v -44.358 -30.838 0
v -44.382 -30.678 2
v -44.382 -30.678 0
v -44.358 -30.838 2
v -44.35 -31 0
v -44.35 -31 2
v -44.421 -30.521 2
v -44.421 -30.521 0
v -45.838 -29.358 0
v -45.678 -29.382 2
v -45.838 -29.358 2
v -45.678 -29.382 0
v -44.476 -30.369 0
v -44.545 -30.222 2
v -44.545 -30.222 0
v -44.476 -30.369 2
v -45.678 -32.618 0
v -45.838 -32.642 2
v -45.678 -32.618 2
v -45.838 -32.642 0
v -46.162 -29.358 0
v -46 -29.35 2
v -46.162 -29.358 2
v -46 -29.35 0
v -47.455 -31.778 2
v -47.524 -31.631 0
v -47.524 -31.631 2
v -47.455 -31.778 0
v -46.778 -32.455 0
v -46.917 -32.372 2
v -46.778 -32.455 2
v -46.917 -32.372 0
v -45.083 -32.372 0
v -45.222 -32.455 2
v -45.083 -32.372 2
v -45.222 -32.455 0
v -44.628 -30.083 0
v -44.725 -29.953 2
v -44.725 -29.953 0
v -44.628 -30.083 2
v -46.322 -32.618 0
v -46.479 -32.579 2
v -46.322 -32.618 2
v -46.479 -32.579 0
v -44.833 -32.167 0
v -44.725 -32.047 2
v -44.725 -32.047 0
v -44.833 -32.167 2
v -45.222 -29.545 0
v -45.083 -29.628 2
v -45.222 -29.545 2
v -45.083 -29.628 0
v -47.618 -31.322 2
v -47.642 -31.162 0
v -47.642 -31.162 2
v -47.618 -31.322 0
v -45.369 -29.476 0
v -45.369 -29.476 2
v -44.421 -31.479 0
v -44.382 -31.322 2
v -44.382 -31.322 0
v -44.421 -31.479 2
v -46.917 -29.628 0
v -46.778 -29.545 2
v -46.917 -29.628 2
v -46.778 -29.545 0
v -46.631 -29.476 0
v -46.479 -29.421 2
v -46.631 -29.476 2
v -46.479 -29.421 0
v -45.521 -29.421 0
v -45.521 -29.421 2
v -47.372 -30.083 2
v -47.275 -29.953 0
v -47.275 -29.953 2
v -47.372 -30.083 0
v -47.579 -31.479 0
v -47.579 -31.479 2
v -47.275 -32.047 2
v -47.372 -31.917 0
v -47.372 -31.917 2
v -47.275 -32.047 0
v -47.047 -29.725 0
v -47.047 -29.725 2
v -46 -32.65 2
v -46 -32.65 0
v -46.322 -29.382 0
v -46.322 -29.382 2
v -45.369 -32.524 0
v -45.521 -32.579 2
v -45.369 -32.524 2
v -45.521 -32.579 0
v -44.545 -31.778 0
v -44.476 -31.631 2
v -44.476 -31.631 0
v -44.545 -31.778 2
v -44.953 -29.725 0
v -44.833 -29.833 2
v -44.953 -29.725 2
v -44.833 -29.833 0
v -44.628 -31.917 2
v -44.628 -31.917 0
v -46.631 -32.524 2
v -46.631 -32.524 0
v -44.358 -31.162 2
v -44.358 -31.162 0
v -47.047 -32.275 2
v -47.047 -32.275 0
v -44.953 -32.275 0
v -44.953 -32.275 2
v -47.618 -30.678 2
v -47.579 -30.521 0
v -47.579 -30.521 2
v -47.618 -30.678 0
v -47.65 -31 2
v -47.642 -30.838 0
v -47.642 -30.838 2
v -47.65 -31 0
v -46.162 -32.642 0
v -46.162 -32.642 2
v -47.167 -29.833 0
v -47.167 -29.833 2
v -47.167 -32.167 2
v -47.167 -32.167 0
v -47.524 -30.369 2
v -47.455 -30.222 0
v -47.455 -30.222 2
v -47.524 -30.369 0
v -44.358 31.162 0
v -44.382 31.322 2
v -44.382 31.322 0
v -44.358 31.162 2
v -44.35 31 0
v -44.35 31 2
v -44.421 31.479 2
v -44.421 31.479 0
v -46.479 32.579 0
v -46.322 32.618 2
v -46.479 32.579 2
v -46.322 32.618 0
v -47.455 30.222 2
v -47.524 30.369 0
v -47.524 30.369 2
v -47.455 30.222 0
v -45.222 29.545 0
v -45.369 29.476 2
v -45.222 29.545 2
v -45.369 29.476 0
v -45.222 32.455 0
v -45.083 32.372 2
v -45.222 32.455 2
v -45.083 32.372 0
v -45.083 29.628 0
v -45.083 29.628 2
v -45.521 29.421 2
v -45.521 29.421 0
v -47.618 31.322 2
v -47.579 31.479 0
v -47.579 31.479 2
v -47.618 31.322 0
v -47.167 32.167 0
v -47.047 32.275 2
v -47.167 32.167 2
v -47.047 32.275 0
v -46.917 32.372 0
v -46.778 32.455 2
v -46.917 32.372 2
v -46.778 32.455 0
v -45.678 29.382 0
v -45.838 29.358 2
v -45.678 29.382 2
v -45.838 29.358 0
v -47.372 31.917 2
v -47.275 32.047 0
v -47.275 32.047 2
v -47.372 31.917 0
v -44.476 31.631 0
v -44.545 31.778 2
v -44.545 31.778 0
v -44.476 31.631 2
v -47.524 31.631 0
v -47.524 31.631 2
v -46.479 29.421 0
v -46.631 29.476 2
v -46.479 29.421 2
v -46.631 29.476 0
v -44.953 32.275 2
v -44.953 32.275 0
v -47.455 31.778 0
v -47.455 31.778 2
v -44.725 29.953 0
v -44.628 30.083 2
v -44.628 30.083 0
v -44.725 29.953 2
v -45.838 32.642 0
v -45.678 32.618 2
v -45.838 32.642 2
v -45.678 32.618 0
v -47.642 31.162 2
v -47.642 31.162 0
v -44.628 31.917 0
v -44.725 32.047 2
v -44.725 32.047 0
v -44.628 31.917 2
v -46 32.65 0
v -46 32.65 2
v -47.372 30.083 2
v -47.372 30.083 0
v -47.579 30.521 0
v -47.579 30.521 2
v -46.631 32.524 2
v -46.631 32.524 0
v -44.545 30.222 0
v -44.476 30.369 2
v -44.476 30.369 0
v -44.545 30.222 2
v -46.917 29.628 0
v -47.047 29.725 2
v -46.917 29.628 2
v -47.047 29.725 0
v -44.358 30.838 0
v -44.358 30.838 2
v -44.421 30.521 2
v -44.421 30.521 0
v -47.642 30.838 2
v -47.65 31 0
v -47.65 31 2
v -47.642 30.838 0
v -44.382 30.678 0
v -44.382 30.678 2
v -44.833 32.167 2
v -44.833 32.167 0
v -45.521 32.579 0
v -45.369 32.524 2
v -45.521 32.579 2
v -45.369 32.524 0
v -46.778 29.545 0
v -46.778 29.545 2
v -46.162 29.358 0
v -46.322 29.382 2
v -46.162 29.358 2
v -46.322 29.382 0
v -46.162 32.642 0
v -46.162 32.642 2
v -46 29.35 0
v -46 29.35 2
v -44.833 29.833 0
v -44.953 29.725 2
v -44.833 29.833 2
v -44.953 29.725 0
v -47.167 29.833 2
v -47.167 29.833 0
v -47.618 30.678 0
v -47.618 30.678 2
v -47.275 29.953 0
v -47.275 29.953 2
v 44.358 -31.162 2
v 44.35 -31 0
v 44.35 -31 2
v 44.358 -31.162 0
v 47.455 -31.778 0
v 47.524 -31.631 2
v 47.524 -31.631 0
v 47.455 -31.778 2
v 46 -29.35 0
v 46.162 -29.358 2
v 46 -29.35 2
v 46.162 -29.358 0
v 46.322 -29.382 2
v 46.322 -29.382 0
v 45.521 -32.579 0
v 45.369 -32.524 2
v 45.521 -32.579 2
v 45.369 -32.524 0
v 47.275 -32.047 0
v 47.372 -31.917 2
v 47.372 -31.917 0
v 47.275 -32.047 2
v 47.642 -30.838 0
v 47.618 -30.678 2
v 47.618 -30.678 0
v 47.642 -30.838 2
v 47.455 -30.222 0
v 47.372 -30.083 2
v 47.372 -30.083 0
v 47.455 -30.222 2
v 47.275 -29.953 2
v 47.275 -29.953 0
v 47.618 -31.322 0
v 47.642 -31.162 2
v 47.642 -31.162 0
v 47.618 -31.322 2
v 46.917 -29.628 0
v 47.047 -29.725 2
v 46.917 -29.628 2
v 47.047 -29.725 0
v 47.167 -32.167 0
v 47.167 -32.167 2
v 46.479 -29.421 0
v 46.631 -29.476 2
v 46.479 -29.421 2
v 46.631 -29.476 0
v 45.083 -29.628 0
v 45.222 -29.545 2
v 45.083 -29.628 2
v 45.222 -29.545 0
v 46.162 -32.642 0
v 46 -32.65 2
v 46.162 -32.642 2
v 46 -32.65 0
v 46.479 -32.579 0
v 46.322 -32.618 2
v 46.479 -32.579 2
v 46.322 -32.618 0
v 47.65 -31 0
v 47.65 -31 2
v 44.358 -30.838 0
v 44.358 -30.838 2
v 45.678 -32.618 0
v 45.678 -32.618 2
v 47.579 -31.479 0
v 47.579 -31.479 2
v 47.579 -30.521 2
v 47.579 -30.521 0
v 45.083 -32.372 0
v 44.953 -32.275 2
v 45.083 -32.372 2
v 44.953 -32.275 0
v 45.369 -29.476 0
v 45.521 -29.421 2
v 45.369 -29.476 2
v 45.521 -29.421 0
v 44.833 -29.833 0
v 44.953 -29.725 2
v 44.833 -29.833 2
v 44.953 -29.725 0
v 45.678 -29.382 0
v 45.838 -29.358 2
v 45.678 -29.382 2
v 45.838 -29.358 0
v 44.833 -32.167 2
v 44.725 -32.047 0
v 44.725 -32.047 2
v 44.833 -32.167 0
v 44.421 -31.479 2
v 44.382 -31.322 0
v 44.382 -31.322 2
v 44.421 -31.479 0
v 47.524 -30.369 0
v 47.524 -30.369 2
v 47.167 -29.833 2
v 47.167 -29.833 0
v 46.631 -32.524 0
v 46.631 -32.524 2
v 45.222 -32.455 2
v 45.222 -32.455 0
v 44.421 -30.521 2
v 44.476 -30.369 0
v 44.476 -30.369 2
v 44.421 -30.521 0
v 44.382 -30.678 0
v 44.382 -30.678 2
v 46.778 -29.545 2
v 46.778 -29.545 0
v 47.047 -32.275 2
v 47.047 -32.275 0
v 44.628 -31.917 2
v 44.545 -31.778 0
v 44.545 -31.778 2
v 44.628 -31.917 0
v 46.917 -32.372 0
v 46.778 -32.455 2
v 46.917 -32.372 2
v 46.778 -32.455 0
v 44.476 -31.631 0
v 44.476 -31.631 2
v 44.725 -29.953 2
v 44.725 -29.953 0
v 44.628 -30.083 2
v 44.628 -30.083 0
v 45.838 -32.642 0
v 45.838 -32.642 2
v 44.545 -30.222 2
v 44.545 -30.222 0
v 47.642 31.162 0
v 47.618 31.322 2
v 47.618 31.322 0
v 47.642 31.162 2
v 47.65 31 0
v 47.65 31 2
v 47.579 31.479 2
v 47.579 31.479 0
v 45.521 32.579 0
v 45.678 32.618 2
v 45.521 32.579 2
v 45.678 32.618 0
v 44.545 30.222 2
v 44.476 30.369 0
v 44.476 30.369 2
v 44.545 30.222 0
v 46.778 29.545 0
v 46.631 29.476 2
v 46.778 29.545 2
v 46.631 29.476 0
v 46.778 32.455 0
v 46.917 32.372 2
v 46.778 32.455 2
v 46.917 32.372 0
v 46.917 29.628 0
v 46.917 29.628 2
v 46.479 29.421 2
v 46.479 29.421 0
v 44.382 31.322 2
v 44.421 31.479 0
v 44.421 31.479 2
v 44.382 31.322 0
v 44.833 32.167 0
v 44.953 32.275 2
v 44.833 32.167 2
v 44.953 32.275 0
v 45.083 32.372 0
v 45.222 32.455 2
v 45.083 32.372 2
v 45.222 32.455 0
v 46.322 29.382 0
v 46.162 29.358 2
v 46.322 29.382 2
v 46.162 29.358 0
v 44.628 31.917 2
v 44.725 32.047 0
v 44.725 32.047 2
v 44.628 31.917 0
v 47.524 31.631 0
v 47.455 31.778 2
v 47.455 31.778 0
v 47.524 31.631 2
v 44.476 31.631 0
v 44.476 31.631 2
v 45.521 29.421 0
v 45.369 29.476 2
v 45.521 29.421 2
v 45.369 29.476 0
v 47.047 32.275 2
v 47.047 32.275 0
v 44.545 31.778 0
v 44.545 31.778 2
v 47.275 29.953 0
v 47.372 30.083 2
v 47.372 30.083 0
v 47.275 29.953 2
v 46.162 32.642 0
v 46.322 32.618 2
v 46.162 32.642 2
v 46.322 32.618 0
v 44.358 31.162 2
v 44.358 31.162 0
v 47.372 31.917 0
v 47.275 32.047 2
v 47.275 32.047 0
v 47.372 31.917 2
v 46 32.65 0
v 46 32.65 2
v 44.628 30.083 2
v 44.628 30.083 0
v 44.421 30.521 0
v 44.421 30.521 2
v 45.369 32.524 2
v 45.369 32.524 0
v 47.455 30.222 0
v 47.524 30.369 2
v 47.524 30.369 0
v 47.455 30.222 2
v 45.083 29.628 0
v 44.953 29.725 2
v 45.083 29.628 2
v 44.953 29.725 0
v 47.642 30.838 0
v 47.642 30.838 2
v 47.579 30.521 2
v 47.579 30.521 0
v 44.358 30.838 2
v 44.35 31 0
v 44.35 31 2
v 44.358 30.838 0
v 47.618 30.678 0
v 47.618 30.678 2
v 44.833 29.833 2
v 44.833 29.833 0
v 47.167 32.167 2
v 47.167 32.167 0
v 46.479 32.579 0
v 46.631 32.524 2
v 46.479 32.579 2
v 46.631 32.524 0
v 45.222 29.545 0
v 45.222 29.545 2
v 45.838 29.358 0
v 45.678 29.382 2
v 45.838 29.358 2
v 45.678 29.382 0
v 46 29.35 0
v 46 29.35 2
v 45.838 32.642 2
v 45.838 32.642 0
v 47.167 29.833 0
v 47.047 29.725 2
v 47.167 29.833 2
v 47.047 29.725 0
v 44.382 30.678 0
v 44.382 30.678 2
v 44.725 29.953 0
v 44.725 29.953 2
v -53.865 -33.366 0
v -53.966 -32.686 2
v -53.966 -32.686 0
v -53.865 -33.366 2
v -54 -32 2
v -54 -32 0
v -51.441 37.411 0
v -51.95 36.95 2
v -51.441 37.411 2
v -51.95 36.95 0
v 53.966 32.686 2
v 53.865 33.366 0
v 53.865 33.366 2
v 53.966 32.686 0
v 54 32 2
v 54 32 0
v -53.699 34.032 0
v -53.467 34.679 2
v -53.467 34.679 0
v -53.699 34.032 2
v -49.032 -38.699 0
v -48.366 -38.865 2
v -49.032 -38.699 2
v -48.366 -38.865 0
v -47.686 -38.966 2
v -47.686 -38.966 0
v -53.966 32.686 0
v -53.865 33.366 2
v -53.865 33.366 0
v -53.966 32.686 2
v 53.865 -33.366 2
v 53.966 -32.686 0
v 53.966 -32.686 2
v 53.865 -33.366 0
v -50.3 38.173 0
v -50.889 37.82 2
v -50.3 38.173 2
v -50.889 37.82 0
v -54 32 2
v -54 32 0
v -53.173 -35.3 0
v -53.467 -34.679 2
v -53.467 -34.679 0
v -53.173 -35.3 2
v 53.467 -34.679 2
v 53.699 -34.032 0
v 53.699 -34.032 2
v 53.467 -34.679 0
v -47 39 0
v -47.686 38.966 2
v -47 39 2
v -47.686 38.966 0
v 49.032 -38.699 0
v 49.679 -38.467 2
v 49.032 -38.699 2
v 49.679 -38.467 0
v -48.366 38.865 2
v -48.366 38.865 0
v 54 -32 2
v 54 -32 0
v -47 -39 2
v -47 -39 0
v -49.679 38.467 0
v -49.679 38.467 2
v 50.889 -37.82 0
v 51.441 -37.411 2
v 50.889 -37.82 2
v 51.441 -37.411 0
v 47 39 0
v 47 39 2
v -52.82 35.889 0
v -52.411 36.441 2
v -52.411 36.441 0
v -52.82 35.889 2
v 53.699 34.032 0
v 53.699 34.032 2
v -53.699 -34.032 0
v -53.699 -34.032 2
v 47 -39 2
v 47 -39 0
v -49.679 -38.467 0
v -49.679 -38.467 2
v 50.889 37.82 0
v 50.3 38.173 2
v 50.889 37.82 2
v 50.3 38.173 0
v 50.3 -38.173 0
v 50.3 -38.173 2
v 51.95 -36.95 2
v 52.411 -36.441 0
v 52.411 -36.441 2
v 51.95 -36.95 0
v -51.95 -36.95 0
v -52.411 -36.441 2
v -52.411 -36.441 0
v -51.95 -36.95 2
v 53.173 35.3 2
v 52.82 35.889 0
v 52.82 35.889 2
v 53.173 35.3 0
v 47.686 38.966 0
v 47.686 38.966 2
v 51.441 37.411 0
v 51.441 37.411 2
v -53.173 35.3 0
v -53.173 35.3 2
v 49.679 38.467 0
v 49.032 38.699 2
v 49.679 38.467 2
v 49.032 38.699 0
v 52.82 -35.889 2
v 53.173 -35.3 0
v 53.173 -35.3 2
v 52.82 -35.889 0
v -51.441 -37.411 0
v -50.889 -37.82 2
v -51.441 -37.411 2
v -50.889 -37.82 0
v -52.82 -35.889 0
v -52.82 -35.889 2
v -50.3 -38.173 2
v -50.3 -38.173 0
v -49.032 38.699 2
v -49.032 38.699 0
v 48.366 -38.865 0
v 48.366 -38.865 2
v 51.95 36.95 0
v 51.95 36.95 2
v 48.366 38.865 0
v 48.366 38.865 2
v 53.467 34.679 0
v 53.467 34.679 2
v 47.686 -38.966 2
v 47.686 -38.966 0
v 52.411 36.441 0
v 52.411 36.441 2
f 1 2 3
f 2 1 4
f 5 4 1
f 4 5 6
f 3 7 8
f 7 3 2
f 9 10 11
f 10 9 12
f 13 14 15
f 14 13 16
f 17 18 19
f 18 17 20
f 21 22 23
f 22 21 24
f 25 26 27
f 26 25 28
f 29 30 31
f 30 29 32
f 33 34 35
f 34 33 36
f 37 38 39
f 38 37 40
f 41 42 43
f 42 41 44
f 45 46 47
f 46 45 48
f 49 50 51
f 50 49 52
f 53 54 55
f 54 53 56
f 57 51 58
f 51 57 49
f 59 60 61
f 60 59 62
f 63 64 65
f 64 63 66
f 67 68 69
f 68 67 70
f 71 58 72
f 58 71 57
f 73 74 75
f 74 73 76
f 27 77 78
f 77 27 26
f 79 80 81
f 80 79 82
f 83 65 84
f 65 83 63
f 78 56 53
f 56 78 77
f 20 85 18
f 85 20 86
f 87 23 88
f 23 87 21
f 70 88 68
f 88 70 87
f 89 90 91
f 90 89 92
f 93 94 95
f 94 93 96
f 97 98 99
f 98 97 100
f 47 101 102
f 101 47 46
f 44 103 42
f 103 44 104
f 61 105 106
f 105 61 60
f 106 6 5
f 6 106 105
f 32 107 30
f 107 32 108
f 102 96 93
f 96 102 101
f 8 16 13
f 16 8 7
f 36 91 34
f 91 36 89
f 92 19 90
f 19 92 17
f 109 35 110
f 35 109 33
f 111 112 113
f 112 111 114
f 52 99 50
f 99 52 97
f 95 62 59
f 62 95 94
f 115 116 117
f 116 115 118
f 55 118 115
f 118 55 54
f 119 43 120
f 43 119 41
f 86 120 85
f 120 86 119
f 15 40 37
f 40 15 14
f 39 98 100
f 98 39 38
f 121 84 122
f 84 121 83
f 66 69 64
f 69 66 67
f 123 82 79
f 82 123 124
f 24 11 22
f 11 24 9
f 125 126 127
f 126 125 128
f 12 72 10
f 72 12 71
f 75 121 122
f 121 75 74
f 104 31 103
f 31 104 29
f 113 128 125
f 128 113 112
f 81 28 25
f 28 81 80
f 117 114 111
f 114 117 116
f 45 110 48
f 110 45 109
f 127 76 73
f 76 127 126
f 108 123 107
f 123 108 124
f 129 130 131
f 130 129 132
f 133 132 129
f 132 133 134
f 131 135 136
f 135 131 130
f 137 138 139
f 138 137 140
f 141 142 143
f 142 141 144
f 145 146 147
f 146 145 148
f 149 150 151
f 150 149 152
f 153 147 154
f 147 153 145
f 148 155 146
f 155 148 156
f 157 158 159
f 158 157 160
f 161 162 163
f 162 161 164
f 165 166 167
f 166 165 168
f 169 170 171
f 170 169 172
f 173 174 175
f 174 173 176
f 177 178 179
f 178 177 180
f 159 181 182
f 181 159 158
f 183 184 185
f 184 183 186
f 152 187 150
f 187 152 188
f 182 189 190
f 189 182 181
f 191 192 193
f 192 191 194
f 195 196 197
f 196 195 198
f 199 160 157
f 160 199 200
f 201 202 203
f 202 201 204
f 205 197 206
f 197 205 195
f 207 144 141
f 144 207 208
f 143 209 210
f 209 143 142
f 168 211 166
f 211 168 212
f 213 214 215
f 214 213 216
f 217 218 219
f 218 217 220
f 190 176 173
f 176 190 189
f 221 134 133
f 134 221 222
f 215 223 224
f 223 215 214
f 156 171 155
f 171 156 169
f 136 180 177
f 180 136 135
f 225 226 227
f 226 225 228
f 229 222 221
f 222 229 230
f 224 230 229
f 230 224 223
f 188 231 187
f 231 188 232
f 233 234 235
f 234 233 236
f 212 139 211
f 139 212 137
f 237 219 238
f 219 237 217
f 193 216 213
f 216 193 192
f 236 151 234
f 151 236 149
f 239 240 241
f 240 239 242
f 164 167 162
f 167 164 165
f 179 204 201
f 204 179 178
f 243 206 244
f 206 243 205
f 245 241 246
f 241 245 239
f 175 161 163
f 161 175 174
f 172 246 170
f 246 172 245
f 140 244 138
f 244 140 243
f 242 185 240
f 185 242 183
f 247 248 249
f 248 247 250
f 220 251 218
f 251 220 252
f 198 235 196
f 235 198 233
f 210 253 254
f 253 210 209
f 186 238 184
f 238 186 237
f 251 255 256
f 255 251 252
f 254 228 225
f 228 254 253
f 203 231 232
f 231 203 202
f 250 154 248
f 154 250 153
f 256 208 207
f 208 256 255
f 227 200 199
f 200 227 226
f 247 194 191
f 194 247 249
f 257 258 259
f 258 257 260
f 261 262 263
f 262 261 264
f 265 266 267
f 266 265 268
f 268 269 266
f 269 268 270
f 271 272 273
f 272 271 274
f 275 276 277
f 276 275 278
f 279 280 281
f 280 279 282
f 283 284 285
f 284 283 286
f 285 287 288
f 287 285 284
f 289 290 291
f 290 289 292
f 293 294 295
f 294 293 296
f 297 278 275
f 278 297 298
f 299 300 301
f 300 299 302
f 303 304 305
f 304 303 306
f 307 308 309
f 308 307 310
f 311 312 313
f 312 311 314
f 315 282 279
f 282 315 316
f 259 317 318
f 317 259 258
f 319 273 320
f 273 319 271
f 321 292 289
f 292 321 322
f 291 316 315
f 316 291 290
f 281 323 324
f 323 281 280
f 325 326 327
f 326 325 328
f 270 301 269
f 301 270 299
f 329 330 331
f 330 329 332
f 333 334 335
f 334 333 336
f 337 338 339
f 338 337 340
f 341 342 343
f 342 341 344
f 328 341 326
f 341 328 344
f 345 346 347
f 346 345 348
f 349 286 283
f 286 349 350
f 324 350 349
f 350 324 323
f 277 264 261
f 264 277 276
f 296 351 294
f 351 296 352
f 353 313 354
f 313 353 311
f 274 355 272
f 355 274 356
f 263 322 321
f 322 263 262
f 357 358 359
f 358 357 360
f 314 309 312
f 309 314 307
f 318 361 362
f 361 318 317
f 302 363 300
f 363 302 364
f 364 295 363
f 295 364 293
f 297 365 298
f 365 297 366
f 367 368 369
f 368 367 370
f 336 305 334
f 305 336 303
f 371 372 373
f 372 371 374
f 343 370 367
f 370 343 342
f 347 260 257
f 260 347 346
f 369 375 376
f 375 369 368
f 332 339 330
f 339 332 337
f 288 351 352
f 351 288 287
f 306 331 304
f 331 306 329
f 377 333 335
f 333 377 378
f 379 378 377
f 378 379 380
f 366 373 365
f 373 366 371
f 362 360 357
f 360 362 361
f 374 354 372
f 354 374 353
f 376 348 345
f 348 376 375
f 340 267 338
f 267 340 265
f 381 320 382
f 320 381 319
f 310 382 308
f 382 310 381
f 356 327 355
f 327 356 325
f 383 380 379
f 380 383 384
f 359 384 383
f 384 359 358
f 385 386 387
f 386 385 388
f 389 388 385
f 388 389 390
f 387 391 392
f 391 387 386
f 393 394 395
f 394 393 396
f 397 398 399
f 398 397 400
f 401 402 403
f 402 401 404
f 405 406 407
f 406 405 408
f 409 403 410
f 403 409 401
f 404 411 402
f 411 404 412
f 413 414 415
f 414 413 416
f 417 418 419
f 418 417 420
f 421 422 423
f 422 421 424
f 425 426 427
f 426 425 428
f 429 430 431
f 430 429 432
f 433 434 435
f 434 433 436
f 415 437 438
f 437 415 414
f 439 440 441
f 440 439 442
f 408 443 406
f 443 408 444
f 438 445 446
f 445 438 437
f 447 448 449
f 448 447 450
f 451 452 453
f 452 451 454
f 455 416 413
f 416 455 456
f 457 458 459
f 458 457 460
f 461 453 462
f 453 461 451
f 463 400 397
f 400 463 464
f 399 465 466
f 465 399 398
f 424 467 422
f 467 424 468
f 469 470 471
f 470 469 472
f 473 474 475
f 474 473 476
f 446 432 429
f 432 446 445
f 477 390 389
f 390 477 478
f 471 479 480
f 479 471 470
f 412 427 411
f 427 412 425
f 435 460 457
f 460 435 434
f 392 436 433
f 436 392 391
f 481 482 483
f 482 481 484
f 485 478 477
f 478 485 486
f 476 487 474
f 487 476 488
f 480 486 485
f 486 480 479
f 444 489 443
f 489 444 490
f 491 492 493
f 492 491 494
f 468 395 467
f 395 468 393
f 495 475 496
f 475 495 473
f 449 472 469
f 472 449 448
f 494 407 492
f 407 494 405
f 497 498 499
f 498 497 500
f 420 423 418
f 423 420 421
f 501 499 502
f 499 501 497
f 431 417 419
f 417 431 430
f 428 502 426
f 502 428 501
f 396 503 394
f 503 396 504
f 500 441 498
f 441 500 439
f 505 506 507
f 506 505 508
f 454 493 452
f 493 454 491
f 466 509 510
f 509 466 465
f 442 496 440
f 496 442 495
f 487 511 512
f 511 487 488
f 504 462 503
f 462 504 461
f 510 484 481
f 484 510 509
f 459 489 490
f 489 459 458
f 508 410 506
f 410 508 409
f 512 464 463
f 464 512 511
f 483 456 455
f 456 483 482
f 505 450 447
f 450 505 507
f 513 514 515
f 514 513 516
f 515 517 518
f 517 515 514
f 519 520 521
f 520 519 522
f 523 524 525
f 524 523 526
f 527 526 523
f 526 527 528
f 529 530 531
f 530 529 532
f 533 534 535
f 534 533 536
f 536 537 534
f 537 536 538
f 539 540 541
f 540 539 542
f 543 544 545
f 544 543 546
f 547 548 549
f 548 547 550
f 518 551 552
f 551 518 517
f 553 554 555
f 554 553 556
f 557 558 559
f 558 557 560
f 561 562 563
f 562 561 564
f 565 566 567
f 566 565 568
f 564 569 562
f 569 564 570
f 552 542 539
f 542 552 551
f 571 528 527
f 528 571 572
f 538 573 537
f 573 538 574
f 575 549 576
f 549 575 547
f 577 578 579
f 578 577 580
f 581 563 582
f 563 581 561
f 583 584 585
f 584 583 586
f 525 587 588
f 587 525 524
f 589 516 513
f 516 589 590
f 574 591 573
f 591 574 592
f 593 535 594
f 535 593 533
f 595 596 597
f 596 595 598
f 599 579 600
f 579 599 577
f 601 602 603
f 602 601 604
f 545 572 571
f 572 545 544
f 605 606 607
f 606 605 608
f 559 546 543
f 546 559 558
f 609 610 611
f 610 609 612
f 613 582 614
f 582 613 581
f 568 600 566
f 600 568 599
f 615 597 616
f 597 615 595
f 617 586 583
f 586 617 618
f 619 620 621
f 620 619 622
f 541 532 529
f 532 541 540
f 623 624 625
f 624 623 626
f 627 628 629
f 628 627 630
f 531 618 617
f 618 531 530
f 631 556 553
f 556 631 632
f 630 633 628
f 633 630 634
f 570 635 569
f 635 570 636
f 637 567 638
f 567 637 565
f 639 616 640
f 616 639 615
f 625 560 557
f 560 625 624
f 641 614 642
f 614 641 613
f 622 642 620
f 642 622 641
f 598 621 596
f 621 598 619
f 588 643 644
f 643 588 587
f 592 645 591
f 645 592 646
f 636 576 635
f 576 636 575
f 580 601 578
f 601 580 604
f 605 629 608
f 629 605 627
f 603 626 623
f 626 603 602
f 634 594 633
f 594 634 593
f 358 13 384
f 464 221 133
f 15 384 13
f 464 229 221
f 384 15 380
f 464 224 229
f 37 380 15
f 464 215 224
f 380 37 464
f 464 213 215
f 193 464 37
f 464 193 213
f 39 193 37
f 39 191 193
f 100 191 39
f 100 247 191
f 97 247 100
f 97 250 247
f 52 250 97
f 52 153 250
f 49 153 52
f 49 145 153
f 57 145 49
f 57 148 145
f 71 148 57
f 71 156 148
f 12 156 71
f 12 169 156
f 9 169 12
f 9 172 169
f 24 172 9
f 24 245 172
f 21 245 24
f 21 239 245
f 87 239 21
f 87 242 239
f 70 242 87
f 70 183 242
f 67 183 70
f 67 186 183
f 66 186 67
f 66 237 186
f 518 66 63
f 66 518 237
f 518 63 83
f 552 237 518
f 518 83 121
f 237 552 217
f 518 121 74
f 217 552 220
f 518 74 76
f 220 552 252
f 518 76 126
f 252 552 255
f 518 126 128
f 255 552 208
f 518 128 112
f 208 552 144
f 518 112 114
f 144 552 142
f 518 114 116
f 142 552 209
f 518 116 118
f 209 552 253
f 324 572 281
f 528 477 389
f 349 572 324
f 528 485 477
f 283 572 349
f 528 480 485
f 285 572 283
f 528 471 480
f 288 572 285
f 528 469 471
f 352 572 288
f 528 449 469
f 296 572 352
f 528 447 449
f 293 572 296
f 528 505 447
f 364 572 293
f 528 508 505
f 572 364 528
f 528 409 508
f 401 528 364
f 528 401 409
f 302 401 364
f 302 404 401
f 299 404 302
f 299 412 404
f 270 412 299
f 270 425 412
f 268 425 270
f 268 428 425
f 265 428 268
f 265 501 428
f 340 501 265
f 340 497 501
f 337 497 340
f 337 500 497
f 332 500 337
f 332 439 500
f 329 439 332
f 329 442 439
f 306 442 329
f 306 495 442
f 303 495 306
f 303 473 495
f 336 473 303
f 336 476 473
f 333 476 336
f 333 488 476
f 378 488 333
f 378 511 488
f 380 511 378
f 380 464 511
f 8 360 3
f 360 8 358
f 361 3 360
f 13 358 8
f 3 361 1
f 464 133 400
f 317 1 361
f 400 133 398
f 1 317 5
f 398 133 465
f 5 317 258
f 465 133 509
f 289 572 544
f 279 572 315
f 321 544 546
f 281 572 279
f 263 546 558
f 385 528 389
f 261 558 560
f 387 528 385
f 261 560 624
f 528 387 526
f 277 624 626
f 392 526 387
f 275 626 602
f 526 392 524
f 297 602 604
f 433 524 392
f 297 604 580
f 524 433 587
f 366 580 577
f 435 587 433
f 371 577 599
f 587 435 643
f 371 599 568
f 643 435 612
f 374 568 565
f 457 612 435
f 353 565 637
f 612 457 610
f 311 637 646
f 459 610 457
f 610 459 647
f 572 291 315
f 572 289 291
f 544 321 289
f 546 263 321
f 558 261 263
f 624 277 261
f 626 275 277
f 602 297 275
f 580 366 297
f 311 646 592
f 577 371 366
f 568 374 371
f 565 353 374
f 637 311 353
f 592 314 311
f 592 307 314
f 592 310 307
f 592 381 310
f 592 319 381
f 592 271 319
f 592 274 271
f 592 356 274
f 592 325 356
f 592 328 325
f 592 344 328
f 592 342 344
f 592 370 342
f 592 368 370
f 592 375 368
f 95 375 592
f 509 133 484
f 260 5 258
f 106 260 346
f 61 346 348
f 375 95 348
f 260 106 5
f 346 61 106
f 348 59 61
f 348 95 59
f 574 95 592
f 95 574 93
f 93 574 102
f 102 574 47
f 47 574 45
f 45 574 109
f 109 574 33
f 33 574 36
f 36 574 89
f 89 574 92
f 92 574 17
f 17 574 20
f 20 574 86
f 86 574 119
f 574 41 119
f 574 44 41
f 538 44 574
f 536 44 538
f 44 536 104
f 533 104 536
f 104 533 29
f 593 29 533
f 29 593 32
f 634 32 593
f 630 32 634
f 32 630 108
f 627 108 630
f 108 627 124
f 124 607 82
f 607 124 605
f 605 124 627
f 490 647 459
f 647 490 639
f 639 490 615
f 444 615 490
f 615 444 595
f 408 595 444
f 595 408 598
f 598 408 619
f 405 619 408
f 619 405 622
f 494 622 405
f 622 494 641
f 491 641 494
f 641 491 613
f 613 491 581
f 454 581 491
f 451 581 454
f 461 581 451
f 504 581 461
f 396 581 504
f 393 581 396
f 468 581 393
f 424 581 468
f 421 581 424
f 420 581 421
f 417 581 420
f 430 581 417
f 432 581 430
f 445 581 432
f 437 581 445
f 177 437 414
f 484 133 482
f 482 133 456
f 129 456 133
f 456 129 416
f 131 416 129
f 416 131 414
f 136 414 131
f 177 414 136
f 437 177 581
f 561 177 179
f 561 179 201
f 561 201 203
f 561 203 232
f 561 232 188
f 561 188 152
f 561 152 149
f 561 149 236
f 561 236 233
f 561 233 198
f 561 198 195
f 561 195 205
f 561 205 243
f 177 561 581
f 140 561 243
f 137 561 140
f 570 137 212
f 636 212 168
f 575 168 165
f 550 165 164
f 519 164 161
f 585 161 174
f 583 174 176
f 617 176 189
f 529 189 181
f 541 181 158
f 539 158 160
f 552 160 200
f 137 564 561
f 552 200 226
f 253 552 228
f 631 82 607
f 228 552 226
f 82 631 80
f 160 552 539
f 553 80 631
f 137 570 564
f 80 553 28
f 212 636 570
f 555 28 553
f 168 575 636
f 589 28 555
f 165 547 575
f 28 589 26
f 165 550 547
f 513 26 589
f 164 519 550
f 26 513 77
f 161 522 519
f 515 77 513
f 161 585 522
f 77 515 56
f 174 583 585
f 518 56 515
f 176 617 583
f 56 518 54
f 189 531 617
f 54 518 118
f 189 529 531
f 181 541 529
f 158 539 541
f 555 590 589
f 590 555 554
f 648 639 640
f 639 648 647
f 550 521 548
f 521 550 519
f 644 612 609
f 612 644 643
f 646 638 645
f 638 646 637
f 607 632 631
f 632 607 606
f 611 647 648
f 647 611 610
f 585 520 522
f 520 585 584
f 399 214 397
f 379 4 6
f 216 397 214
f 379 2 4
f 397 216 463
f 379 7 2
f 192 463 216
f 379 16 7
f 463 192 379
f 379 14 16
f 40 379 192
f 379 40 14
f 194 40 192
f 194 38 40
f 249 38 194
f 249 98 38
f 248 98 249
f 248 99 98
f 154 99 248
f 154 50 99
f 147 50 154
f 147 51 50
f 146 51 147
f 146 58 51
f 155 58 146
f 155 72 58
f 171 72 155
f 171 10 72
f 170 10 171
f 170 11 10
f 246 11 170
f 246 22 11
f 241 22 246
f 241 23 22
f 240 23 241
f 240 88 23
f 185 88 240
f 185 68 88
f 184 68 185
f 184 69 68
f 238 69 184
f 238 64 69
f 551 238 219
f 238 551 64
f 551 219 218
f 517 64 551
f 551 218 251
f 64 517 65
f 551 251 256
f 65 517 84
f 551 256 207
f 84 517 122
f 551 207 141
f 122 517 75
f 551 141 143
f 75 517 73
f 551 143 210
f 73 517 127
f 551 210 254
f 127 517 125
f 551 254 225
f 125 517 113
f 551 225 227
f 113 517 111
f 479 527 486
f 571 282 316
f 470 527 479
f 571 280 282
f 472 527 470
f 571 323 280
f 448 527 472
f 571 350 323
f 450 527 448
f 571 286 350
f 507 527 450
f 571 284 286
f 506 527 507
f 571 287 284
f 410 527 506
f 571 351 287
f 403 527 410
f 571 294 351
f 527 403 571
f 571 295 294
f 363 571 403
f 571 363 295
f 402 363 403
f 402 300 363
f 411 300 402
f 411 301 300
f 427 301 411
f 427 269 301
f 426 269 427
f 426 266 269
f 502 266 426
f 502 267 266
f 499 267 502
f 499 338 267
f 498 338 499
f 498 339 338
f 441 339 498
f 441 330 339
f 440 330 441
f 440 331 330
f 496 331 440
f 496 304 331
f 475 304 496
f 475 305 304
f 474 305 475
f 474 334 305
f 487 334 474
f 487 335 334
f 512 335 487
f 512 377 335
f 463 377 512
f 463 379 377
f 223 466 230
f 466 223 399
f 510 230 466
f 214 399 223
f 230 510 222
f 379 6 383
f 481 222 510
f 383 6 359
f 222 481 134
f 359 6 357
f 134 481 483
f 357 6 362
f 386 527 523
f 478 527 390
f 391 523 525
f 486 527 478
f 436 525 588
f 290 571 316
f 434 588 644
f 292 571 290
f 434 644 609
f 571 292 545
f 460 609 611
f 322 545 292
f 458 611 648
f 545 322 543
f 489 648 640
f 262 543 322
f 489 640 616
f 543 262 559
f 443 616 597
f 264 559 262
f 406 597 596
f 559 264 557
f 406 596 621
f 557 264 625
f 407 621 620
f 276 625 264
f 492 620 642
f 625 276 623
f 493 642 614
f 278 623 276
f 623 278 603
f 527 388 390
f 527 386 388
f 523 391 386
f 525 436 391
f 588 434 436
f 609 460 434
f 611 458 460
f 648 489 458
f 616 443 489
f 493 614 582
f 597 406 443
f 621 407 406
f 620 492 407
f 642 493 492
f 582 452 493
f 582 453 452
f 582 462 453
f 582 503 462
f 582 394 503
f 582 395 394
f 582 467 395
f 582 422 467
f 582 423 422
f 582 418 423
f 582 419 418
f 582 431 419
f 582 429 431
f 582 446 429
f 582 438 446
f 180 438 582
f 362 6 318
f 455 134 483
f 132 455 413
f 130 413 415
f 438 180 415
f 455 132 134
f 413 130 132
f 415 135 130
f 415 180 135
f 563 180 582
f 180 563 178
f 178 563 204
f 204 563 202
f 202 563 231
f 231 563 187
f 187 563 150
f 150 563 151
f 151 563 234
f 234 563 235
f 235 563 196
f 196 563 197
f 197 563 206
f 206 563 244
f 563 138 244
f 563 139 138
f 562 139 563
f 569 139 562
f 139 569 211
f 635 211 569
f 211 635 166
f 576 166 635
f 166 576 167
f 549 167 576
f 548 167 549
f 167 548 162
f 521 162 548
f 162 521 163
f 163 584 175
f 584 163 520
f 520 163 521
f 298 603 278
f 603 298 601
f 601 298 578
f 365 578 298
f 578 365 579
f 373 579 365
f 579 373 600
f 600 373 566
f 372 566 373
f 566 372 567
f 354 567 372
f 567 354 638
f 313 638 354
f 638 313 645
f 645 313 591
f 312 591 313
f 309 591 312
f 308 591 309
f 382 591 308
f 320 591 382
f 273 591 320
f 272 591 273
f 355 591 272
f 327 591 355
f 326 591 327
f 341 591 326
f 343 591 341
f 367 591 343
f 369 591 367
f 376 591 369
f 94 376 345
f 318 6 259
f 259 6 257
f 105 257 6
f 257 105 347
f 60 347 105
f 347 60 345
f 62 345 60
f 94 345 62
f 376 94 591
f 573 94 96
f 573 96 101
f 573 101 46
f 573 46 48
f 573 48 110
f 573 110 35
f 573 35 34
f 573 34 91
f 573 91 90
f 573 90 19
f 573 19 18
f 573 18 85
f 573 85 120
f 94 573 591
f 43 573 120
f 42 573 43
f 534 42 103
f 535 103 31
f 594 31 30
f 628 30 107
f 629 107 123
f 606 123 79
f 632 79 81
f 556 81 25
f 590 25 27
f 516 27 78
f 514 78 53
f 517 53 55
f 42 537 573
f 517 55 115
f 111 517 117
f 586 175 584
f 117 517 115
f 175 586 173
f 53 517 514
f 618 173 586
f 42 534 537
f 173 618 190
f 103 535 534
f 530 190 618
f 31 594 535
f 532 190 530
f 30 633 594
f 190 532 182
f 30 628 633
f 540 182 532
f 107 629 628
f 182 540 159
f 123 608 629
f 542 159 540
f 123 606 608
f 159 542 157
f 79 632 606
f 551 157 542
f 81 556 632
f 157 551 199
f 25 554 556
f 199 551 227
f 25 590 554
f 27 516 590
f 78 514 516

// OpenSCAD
// Millimetres. Render selected part (F6), then export STL.
// Demonstration sizing only: replace measured_neck with a measured circumference.
part = "lid"; // base, lid, strap, assembly, exploded
uno = true; // true: 108x78x32; false: reference 86x60x22
measured_neck = 0; // 0 means UNMEASURED
demo_neck = 900; // illustrative only, NOT a cattle average
fit_allowance = 40; // must be assessed for the animal
closure_allowance = 140; // must match chosen hardware
strap_width=32;
strap_thickness=2.5;
adjustment_pitch=15;
adjustment_holes=9;
sensor_slot_length=12;
sensor_slot_width=8;
sensor_slot_x=0;
sensor_slot_y=22; // off the central 32mm strap path
L=uno?108:86; W=uno?78:60; H=uno?32:22;
wall=2.4; floor=2.4; lid_thickness=2; B=H-lid_thickness;
C=(measured_neck>0?measured_neck:demo_neck)+fit_allowance;
blank_length=C+closure_allowance;
$fn=64;
module rounded(l,w,h,r) {
  linear_extrude(h) hull()
    for(x=[-l/2+r,l/2-r],y=[-w/2+r,w/2-r])
      translate([x,y]) circle(r);
}
module posts() { for(x=[-L/2+8,L/2-8],y=[-W/2+8,W/2-8]) translate([x,y,0]) children(); }
module base() {
  difference() {
    union() {
      difference() {
        rounded(L,W,B,7);
        translate([0,0,floor]) rounded(L-2*wall,W-2*wall,B,4.6);
      }
      posts() translate([0,0,floor]) cylinder(h=B-floor,r=4.5);
      for(x=[-L/2-4,L/2+4]) translate([x,0,0]) difference() {
        rounded(14,strap_width+12,4,4);
        translate([0,0,-1]) rounded(6,strap_width+2,6,2);
      }
    }
    posts() translate([0,0,B-10]) cylinder(h=11,r=1.25);
    translate([sensor_slot_x,sensor_slot_y,-1]) rounded(sensor_slot_length,sensor_slot_width,floor+2,1.5);
  }
}
module lid() { difference() {
  rounded(L,W,lid_thickness,7);
  posts() translate([0,0,-1]) cylinder(h=lid_thickness+2,r=1.65);
} }
module strap() { difference() {
  rounded(blank_length,strap_width,strap_thickness,6);
  for(i=[0:adjustment_holes-1]) translate([blank_length/2-20-i*adjustment_pitch,0,-1]) cylinder(h=strap_thickness+2,r=2.5);
} }
if(part=="base") base();
if(part=="lid") lid();
if(part=="strap") strap();
if(part=="exploded") { color("SlateGray") base(); color("LightBlue") translate([0,0,B+12]) lid(); }
if(part=="assembly") {
  // Visualization only: no functional buckle or release mechanism.
  R=C/(2*PI);
  color("Olive") difference() { cylinder(h=strap_width,r=R+strap_thickness); translate([0,0,-1]) cylinder(h=strap_width+2,r=R); }
  translate([0,-R-strap_thickness,strap_width/2]) rotate([90,0,0]) {
    color("SlateGray") base(); color("LightBlue") translate([0,0,B]) lid();
  }
}
